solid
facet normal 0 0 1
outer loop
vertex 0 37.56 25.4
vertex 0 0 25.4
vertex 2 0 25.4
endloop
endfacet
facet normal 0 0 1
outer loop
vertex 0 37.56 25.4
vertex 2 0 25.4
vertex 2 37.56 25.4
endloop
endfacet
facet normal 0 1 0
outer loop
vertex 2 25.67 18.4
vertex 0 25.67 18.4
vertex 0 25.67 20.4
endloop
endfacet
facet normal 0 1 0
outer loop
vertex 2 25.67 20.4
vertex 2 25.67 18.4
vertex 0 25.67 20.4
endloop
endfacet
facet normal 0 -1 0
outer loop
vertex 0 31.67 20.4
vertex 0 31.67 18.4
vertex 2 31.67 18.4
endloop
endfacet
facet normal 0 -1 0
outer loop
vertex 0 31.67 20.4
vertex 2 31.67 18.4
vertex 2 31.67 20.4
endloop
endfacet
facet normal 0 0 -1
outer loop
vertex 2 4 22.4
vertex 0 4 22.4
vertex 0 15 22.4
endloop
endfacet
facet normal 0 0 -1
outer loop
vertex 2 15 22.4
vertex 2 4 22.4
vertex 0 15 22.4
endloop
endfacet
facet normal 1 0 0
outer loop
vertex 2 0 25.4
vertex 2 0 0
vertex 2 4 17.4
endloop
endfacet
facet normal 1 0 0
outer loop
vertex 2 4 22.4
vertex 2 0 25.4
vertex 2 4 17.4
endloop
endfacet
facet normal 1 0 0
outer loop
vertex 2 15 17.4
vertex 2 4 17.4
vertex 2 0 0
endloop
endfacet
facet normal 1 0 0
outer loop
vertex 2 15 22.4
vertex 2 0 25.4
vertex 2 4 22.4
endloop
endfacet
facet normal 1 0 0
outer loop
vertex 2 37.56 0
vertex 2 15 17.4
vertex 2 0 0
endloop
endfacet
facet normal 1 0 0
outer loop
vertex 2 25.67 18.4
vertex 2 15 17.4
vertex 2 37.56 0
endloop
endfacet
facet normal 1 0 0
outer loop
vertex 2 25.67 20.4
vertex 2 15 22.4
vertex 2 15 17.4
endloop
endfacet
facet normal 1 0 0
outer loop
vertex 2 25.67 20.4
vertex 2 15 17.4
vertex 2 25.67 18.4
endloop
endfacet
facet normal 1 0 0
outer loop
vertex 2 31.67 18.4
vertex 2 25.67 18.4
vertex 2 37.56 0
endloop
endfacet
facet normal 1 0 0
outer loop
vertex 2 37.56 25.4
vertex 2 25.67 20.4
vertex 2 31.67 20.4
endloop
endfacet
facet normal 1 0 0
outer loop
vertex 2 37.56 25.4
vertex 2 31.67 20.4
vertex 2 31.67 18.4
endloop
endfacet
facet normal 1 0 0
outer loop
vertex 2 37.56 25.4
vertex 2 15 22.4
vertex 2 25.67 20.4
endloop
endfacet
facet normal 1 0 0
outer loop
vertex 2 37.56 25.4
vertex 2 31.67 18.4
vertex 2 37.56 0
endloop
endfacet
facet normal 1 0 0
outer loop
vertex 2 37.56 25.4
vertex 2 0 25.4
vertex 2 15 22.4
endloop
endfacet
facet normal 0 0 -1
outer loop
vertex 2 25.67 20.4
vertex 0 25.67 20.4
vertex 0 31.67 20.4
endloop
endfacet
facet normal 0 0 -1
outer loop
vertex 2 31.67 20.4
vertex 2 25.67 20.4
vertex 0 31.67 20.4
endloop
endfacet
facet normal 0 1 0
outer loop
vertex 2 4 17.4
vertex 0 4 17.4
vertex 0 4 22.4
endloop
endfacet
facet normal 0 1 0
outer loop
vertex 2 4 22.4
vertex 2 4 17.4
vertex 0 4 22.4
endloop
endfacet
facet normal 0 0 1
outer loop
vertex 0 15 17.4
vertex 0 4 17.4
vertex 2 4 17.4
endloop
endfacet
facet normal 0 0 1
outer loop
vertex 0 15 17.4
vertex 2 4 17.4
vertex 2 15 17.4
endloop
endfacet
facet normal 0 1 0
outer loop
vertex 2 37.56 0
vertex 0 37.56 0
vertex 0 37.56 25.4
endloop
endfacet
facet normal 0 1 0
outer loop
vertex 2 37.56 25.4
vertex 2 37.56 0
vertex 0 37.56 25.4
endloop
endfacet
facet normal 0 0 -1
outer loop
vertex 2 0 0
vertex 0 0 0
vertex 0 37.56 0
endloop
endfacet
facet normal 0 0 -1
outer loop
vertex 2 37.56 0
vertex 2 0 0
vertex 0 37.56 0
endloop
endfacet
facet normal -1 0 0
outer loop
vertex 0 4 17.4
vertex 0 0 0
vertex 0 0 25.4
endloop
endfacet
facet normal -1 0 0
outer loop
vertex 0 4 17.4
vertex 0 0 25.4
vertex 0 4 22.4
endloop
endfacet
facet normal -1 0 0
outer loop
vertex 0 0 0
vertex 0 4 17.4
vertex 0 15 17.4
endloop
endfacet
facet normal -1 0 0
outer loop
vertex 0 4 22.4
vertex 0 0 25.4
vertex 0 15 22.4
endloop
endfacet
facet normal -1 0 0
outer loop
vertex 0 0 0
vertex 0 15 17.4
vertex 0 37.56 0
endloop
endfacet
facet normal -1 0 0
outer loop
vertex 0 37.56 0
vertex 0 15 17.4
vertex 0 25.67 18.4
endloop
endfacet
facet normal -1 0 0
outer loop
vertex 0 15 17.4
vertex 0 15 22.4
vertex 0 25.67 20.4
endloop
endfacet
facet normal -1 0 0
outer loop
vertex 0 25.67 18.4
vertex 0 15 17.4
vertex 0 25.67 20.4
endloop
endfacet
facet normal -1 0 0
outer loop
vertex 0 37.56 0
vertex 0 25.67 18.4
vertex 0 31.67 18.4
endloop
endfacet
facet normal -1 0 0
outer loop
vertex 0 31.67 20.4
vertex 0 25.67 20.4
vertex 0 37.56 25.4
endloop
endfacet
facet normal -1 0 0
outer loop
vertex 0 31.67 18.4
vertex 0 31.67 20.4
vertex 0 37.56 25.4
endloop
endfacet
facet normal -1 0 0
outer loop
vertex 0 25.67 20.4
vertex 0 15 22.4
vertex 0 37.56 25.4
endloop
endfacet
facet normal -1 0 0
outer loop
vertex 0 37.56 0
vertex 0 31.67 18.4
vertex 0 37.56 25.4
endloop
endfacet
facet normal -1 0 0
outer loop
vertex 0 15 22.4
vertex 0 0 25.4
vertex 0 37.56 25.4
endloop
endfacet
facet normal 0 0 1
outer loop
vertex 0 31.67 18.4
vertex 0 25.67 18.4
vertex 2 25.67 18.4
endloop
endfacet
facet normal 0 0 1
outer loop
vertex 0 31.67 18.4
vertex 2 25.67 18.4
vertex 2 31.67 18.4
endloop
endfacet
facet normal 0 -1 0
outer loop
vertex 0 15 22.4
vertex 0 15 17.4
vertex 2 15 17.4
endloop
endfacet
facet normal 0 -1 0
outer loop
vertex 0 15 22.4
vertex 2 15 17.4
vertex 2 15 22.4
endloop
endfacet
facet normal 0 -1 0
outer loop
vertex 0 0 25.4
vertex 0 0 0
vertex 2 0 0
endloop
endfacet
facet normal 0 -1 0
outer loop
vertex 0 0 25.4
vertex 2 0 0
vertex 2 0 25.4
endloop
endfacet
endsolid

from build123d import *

# Parameters (mm, degrees)
F0_W     = 37.56
F0_H     = 25.4
F0_W_2   = 11
F0_H_2   = 5
F0_W_3   = 6
F0_H_3   = 2
F1_DEPTH = 2


with BuildPart() as f1:
    # F0 (on Right) → F1 (new body)
    with BuildSketch(Plane.YZ):
        with Locations((18.78, 12.7)):
            Rectangle(F0_W, F0_H)
        with Locations((9.5, 19.9)):
            Rectangle(F0_W_2, F0_H_2, mode=Mode.SUBTRACT)
        with Locations((28.67, 19.4)):
            Rectangle(F0_W_3, F0_H_3, mode=Mode.SUBTRACT)
    extrude(amount=F1_DEPTH)


solid = f1.part
